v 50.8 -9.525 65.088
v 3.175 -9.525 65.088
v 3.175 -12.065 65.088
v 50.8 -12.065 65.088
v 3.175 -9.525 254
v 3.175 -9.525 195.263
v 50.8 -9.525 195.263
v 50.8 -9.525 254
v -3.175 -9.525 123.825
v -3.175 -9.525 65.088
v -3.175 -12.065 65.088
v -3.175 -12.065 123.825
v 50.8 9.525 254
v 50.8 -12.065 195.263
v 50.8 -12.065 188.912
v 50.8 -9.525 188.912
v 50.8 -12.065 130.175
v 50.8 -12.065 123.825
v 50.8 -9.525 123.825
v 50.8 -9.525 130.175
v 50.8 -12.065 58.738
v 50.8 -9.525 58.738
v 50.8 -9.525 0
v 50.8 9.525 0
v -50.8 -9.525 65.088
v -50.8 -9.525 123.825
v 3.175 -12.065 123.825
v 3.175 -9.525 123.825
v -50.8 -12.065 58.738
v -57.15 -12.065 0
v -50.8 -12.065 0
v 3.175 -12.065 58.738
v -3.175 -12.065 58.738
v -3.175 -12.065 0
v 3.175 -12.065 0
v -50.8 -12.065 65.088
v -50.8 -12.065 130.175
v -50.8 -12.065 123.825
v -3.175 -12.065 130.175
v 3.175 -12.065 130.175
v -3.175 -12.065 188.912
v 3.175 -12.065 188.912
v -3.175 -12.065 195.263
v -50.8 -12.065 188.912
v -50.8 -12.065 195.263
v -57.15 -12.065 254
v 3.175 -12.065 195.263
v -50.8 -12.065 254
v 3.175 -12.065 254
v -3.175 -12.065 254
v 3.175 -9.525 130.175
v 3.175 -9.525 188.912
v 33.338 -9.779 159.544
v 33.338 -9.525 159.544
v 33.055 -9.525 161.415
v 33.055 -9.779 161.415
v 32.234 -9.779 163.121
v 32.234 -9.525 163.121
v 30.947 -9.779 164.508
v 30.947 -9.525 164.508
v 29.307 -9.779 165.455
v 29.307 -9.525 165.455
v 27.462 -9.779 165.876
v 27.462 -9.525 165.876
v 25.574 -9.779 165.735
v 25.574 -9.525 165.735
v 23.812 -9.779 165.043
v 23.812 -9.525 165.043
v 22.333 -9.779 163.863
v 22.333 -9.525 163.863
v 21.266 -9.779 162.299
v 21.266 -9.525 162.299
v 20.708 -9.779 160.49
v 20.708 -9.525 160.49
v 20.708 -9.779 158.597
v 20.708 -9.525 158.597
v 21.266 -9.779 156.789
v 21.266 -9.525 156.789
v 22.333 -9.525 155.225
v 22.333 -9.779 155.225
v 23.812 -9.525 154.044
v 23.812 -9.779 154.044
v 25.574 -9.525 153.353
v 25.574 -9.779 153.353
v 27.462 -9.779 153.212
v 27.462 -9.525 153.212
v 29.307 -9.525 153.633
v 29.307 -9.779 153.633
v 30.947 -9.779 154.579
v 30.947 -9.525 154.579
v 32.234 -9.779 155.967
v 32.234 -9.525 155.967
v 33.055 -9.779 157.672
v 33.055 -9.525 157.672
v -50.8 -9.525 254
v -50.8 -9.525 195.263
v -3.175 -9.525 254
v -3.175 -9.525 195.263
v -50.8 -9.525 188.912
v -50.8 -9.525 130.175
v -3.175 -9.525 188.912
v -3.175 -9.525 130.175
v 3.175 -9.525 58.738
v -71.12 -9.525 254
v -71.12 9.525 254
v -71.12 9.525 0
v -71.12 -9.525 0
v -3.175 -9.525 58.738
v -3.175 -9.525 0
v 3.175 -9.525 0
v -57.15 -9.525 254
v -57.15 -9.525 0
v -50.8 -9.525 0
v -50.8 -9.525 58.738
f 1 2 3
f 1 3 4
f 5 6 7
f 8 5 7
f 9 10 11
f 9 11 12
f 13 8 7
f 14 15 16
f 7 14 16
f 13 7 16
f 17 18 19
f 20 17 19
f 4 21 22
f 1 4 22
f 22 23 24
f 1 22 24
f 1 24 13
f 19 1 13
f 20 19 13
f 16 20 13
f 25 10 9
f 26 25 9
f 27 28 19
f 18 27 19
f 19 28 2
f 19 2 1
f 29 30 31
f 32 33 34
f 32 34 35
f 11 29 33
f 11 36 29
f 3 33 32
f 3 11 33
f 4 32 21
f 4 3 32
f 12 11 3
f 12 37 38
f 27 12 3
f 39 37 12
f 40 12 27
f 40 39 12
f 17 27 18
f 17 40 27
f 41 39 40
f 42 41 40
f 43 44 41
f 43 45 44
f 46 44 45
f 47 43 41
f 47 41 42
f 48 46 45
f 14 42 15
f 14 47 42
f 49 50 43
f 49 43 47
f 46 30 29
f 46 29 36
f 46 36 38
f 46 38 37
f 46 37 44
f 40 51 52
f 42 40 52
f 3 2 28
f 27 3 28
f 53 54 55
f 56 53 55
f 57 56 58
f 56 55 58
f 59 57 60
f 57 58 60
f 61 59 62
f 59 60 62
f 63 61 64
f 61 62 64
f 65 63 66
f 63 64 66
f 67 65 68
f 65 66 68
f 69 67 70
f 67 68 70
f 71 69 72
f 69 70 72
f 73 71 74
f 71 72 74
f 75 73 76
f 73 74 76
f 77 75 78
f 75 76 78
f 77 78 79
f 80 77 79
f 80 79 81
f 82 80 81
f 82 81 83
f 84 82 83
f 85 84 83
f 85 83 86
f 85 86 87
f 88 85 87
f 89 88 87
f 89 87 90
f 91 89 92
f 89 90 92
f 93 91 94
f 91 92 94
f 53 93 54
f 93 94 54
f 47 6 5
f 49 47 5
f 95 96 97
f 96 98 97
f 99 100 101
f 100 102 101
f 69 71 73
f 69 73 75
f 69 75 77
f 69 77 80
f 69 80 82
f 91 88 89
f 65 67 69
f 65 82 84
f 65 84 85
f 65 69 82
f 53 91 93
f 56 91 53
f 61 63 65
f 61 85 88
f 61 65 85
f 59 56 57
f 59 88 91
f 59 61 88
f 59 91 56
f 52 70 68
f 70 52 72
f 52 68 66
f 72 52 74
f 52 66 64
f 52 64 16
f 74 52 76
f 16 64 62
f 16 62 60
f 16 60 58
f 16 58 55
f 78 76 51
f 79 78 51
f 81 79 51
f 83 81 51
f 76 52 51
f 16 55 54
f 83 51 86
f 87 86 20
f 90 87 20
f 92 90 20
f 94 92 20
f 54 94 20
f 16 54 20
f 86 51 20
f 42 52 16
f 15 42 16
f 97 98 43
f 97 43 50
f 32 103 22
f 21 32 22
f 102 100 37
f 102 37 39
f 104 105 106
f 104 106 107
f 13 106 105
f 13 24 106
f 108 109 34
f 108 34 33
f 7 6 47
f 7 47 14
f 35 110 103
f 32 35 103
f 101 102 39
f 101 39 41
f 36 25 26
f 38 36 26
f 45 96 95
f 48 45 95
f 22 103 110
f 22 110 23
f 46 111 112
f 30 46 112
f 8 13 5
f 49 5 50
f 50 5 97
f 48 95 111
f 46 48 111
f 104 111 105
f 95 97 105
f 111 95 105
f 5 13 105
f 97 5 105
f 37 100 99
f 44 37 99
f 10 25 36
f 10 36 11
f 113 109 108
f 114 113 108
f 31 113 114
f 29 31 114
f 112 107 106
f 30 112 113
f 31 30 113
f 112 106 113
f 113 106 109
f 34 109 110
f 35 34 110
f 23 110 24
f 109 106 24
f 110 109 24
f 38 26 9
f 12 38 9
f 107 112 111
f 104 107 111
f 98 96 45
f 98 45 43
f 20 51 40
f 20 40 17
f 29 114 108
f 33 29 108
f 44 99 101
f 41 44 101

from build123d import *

# Parameters (mm, degrees)
F0_W      = 101.6
F0_H      = 19.05
F1_DEPTH  = 254
F2_W      = 6.35
F2_H      = 254
F3_DEPTH  = 2.54
F4_W      = 101.6
F4_H      = 6.35
F5_DEPTH  = 2.54
F6_W      = 101.6
F6_H      = 6.35
F7_DEPTH  = 2.54
F8_W      = 101.6
F8_H      = 6.35
F9_DEPTH  = 2.54
F10_R     = 6.35
F11_DEPTH = 0.254
F12_W     = 19.05
F12_H     = 254
F13_DEPTH = 20.32
F15_DEPTH = 2.54


with BuildPart() as f1:
    # F0 (on Top) → F1 (new body)
    with BuildSketch(Plane.XY):
        Rectangle(F0_W, F0_H)
    extrude(amount=F1_DEPTH)

    # F2 (on face) → F3 (join)
    with BuildSketch(Plane.XZ.offset(9.525)):
        with Locations((0, 127)):
            Rectangle(F2_W, F2_H)
    extrude(amount=F3_DEPTH)

    # F4 (on face) → F5 (join)
    with BuildSketch(Plane.XZ.offset(9.525)):
        with Locations((0, 127)):
            Rectangle(F4_W, F4_H)
    extrude(amount=F5_DEPTH)

    # F6 (on face) → F7 (join)
    with BuildSketch(Plane.XZ.offset(9.525)):
        with Locations((0, 192.0875)):
            Rectangle(F6_W, F6_H)
    extrude(amount=F7_DEPTH)

    # F8 (on face) → F9 (join)
    with BuildSketch(Plane.XZ.offset(9.525)):
        with Locations((0, 61.9125)):
            Rectangle(F8_W, F8_H)
    extrude(amount=F9_DEPTH)

    # F10 (on face) → F11 (join)
    with BuildSketch(Plane.XZ.offset(9.525)):
        with Locations((26.9875, 159.54375)):
            Circle(F10_R)
    extrude(amount=F11_DEPTH)

    # F12 (on face) → F13 (join)
    with BuildSketch(Plane(origin=(-50.8, 0, 0), x_dir=(0, -1, 0), z_dir=(-1, 0, 0))):
        with Locations((0, 127)):
            Rectangle(F12_W, F12_H)
    extrude(amount=F13_DEPTH)

    # F14 (on face) → F15 (join)
    with BuildSketch(Plane.XZ.offset(9.525)):
        Polygon((-50.8, 123.825), (-50.8, 127), (-50.8, 128.689587), (-50.8, 254), (-57.15, 254), (-57.15, 0), (-50.8, 0), align=None)
    extrude(amount=F15_DEPTH)


solid = f1.part
